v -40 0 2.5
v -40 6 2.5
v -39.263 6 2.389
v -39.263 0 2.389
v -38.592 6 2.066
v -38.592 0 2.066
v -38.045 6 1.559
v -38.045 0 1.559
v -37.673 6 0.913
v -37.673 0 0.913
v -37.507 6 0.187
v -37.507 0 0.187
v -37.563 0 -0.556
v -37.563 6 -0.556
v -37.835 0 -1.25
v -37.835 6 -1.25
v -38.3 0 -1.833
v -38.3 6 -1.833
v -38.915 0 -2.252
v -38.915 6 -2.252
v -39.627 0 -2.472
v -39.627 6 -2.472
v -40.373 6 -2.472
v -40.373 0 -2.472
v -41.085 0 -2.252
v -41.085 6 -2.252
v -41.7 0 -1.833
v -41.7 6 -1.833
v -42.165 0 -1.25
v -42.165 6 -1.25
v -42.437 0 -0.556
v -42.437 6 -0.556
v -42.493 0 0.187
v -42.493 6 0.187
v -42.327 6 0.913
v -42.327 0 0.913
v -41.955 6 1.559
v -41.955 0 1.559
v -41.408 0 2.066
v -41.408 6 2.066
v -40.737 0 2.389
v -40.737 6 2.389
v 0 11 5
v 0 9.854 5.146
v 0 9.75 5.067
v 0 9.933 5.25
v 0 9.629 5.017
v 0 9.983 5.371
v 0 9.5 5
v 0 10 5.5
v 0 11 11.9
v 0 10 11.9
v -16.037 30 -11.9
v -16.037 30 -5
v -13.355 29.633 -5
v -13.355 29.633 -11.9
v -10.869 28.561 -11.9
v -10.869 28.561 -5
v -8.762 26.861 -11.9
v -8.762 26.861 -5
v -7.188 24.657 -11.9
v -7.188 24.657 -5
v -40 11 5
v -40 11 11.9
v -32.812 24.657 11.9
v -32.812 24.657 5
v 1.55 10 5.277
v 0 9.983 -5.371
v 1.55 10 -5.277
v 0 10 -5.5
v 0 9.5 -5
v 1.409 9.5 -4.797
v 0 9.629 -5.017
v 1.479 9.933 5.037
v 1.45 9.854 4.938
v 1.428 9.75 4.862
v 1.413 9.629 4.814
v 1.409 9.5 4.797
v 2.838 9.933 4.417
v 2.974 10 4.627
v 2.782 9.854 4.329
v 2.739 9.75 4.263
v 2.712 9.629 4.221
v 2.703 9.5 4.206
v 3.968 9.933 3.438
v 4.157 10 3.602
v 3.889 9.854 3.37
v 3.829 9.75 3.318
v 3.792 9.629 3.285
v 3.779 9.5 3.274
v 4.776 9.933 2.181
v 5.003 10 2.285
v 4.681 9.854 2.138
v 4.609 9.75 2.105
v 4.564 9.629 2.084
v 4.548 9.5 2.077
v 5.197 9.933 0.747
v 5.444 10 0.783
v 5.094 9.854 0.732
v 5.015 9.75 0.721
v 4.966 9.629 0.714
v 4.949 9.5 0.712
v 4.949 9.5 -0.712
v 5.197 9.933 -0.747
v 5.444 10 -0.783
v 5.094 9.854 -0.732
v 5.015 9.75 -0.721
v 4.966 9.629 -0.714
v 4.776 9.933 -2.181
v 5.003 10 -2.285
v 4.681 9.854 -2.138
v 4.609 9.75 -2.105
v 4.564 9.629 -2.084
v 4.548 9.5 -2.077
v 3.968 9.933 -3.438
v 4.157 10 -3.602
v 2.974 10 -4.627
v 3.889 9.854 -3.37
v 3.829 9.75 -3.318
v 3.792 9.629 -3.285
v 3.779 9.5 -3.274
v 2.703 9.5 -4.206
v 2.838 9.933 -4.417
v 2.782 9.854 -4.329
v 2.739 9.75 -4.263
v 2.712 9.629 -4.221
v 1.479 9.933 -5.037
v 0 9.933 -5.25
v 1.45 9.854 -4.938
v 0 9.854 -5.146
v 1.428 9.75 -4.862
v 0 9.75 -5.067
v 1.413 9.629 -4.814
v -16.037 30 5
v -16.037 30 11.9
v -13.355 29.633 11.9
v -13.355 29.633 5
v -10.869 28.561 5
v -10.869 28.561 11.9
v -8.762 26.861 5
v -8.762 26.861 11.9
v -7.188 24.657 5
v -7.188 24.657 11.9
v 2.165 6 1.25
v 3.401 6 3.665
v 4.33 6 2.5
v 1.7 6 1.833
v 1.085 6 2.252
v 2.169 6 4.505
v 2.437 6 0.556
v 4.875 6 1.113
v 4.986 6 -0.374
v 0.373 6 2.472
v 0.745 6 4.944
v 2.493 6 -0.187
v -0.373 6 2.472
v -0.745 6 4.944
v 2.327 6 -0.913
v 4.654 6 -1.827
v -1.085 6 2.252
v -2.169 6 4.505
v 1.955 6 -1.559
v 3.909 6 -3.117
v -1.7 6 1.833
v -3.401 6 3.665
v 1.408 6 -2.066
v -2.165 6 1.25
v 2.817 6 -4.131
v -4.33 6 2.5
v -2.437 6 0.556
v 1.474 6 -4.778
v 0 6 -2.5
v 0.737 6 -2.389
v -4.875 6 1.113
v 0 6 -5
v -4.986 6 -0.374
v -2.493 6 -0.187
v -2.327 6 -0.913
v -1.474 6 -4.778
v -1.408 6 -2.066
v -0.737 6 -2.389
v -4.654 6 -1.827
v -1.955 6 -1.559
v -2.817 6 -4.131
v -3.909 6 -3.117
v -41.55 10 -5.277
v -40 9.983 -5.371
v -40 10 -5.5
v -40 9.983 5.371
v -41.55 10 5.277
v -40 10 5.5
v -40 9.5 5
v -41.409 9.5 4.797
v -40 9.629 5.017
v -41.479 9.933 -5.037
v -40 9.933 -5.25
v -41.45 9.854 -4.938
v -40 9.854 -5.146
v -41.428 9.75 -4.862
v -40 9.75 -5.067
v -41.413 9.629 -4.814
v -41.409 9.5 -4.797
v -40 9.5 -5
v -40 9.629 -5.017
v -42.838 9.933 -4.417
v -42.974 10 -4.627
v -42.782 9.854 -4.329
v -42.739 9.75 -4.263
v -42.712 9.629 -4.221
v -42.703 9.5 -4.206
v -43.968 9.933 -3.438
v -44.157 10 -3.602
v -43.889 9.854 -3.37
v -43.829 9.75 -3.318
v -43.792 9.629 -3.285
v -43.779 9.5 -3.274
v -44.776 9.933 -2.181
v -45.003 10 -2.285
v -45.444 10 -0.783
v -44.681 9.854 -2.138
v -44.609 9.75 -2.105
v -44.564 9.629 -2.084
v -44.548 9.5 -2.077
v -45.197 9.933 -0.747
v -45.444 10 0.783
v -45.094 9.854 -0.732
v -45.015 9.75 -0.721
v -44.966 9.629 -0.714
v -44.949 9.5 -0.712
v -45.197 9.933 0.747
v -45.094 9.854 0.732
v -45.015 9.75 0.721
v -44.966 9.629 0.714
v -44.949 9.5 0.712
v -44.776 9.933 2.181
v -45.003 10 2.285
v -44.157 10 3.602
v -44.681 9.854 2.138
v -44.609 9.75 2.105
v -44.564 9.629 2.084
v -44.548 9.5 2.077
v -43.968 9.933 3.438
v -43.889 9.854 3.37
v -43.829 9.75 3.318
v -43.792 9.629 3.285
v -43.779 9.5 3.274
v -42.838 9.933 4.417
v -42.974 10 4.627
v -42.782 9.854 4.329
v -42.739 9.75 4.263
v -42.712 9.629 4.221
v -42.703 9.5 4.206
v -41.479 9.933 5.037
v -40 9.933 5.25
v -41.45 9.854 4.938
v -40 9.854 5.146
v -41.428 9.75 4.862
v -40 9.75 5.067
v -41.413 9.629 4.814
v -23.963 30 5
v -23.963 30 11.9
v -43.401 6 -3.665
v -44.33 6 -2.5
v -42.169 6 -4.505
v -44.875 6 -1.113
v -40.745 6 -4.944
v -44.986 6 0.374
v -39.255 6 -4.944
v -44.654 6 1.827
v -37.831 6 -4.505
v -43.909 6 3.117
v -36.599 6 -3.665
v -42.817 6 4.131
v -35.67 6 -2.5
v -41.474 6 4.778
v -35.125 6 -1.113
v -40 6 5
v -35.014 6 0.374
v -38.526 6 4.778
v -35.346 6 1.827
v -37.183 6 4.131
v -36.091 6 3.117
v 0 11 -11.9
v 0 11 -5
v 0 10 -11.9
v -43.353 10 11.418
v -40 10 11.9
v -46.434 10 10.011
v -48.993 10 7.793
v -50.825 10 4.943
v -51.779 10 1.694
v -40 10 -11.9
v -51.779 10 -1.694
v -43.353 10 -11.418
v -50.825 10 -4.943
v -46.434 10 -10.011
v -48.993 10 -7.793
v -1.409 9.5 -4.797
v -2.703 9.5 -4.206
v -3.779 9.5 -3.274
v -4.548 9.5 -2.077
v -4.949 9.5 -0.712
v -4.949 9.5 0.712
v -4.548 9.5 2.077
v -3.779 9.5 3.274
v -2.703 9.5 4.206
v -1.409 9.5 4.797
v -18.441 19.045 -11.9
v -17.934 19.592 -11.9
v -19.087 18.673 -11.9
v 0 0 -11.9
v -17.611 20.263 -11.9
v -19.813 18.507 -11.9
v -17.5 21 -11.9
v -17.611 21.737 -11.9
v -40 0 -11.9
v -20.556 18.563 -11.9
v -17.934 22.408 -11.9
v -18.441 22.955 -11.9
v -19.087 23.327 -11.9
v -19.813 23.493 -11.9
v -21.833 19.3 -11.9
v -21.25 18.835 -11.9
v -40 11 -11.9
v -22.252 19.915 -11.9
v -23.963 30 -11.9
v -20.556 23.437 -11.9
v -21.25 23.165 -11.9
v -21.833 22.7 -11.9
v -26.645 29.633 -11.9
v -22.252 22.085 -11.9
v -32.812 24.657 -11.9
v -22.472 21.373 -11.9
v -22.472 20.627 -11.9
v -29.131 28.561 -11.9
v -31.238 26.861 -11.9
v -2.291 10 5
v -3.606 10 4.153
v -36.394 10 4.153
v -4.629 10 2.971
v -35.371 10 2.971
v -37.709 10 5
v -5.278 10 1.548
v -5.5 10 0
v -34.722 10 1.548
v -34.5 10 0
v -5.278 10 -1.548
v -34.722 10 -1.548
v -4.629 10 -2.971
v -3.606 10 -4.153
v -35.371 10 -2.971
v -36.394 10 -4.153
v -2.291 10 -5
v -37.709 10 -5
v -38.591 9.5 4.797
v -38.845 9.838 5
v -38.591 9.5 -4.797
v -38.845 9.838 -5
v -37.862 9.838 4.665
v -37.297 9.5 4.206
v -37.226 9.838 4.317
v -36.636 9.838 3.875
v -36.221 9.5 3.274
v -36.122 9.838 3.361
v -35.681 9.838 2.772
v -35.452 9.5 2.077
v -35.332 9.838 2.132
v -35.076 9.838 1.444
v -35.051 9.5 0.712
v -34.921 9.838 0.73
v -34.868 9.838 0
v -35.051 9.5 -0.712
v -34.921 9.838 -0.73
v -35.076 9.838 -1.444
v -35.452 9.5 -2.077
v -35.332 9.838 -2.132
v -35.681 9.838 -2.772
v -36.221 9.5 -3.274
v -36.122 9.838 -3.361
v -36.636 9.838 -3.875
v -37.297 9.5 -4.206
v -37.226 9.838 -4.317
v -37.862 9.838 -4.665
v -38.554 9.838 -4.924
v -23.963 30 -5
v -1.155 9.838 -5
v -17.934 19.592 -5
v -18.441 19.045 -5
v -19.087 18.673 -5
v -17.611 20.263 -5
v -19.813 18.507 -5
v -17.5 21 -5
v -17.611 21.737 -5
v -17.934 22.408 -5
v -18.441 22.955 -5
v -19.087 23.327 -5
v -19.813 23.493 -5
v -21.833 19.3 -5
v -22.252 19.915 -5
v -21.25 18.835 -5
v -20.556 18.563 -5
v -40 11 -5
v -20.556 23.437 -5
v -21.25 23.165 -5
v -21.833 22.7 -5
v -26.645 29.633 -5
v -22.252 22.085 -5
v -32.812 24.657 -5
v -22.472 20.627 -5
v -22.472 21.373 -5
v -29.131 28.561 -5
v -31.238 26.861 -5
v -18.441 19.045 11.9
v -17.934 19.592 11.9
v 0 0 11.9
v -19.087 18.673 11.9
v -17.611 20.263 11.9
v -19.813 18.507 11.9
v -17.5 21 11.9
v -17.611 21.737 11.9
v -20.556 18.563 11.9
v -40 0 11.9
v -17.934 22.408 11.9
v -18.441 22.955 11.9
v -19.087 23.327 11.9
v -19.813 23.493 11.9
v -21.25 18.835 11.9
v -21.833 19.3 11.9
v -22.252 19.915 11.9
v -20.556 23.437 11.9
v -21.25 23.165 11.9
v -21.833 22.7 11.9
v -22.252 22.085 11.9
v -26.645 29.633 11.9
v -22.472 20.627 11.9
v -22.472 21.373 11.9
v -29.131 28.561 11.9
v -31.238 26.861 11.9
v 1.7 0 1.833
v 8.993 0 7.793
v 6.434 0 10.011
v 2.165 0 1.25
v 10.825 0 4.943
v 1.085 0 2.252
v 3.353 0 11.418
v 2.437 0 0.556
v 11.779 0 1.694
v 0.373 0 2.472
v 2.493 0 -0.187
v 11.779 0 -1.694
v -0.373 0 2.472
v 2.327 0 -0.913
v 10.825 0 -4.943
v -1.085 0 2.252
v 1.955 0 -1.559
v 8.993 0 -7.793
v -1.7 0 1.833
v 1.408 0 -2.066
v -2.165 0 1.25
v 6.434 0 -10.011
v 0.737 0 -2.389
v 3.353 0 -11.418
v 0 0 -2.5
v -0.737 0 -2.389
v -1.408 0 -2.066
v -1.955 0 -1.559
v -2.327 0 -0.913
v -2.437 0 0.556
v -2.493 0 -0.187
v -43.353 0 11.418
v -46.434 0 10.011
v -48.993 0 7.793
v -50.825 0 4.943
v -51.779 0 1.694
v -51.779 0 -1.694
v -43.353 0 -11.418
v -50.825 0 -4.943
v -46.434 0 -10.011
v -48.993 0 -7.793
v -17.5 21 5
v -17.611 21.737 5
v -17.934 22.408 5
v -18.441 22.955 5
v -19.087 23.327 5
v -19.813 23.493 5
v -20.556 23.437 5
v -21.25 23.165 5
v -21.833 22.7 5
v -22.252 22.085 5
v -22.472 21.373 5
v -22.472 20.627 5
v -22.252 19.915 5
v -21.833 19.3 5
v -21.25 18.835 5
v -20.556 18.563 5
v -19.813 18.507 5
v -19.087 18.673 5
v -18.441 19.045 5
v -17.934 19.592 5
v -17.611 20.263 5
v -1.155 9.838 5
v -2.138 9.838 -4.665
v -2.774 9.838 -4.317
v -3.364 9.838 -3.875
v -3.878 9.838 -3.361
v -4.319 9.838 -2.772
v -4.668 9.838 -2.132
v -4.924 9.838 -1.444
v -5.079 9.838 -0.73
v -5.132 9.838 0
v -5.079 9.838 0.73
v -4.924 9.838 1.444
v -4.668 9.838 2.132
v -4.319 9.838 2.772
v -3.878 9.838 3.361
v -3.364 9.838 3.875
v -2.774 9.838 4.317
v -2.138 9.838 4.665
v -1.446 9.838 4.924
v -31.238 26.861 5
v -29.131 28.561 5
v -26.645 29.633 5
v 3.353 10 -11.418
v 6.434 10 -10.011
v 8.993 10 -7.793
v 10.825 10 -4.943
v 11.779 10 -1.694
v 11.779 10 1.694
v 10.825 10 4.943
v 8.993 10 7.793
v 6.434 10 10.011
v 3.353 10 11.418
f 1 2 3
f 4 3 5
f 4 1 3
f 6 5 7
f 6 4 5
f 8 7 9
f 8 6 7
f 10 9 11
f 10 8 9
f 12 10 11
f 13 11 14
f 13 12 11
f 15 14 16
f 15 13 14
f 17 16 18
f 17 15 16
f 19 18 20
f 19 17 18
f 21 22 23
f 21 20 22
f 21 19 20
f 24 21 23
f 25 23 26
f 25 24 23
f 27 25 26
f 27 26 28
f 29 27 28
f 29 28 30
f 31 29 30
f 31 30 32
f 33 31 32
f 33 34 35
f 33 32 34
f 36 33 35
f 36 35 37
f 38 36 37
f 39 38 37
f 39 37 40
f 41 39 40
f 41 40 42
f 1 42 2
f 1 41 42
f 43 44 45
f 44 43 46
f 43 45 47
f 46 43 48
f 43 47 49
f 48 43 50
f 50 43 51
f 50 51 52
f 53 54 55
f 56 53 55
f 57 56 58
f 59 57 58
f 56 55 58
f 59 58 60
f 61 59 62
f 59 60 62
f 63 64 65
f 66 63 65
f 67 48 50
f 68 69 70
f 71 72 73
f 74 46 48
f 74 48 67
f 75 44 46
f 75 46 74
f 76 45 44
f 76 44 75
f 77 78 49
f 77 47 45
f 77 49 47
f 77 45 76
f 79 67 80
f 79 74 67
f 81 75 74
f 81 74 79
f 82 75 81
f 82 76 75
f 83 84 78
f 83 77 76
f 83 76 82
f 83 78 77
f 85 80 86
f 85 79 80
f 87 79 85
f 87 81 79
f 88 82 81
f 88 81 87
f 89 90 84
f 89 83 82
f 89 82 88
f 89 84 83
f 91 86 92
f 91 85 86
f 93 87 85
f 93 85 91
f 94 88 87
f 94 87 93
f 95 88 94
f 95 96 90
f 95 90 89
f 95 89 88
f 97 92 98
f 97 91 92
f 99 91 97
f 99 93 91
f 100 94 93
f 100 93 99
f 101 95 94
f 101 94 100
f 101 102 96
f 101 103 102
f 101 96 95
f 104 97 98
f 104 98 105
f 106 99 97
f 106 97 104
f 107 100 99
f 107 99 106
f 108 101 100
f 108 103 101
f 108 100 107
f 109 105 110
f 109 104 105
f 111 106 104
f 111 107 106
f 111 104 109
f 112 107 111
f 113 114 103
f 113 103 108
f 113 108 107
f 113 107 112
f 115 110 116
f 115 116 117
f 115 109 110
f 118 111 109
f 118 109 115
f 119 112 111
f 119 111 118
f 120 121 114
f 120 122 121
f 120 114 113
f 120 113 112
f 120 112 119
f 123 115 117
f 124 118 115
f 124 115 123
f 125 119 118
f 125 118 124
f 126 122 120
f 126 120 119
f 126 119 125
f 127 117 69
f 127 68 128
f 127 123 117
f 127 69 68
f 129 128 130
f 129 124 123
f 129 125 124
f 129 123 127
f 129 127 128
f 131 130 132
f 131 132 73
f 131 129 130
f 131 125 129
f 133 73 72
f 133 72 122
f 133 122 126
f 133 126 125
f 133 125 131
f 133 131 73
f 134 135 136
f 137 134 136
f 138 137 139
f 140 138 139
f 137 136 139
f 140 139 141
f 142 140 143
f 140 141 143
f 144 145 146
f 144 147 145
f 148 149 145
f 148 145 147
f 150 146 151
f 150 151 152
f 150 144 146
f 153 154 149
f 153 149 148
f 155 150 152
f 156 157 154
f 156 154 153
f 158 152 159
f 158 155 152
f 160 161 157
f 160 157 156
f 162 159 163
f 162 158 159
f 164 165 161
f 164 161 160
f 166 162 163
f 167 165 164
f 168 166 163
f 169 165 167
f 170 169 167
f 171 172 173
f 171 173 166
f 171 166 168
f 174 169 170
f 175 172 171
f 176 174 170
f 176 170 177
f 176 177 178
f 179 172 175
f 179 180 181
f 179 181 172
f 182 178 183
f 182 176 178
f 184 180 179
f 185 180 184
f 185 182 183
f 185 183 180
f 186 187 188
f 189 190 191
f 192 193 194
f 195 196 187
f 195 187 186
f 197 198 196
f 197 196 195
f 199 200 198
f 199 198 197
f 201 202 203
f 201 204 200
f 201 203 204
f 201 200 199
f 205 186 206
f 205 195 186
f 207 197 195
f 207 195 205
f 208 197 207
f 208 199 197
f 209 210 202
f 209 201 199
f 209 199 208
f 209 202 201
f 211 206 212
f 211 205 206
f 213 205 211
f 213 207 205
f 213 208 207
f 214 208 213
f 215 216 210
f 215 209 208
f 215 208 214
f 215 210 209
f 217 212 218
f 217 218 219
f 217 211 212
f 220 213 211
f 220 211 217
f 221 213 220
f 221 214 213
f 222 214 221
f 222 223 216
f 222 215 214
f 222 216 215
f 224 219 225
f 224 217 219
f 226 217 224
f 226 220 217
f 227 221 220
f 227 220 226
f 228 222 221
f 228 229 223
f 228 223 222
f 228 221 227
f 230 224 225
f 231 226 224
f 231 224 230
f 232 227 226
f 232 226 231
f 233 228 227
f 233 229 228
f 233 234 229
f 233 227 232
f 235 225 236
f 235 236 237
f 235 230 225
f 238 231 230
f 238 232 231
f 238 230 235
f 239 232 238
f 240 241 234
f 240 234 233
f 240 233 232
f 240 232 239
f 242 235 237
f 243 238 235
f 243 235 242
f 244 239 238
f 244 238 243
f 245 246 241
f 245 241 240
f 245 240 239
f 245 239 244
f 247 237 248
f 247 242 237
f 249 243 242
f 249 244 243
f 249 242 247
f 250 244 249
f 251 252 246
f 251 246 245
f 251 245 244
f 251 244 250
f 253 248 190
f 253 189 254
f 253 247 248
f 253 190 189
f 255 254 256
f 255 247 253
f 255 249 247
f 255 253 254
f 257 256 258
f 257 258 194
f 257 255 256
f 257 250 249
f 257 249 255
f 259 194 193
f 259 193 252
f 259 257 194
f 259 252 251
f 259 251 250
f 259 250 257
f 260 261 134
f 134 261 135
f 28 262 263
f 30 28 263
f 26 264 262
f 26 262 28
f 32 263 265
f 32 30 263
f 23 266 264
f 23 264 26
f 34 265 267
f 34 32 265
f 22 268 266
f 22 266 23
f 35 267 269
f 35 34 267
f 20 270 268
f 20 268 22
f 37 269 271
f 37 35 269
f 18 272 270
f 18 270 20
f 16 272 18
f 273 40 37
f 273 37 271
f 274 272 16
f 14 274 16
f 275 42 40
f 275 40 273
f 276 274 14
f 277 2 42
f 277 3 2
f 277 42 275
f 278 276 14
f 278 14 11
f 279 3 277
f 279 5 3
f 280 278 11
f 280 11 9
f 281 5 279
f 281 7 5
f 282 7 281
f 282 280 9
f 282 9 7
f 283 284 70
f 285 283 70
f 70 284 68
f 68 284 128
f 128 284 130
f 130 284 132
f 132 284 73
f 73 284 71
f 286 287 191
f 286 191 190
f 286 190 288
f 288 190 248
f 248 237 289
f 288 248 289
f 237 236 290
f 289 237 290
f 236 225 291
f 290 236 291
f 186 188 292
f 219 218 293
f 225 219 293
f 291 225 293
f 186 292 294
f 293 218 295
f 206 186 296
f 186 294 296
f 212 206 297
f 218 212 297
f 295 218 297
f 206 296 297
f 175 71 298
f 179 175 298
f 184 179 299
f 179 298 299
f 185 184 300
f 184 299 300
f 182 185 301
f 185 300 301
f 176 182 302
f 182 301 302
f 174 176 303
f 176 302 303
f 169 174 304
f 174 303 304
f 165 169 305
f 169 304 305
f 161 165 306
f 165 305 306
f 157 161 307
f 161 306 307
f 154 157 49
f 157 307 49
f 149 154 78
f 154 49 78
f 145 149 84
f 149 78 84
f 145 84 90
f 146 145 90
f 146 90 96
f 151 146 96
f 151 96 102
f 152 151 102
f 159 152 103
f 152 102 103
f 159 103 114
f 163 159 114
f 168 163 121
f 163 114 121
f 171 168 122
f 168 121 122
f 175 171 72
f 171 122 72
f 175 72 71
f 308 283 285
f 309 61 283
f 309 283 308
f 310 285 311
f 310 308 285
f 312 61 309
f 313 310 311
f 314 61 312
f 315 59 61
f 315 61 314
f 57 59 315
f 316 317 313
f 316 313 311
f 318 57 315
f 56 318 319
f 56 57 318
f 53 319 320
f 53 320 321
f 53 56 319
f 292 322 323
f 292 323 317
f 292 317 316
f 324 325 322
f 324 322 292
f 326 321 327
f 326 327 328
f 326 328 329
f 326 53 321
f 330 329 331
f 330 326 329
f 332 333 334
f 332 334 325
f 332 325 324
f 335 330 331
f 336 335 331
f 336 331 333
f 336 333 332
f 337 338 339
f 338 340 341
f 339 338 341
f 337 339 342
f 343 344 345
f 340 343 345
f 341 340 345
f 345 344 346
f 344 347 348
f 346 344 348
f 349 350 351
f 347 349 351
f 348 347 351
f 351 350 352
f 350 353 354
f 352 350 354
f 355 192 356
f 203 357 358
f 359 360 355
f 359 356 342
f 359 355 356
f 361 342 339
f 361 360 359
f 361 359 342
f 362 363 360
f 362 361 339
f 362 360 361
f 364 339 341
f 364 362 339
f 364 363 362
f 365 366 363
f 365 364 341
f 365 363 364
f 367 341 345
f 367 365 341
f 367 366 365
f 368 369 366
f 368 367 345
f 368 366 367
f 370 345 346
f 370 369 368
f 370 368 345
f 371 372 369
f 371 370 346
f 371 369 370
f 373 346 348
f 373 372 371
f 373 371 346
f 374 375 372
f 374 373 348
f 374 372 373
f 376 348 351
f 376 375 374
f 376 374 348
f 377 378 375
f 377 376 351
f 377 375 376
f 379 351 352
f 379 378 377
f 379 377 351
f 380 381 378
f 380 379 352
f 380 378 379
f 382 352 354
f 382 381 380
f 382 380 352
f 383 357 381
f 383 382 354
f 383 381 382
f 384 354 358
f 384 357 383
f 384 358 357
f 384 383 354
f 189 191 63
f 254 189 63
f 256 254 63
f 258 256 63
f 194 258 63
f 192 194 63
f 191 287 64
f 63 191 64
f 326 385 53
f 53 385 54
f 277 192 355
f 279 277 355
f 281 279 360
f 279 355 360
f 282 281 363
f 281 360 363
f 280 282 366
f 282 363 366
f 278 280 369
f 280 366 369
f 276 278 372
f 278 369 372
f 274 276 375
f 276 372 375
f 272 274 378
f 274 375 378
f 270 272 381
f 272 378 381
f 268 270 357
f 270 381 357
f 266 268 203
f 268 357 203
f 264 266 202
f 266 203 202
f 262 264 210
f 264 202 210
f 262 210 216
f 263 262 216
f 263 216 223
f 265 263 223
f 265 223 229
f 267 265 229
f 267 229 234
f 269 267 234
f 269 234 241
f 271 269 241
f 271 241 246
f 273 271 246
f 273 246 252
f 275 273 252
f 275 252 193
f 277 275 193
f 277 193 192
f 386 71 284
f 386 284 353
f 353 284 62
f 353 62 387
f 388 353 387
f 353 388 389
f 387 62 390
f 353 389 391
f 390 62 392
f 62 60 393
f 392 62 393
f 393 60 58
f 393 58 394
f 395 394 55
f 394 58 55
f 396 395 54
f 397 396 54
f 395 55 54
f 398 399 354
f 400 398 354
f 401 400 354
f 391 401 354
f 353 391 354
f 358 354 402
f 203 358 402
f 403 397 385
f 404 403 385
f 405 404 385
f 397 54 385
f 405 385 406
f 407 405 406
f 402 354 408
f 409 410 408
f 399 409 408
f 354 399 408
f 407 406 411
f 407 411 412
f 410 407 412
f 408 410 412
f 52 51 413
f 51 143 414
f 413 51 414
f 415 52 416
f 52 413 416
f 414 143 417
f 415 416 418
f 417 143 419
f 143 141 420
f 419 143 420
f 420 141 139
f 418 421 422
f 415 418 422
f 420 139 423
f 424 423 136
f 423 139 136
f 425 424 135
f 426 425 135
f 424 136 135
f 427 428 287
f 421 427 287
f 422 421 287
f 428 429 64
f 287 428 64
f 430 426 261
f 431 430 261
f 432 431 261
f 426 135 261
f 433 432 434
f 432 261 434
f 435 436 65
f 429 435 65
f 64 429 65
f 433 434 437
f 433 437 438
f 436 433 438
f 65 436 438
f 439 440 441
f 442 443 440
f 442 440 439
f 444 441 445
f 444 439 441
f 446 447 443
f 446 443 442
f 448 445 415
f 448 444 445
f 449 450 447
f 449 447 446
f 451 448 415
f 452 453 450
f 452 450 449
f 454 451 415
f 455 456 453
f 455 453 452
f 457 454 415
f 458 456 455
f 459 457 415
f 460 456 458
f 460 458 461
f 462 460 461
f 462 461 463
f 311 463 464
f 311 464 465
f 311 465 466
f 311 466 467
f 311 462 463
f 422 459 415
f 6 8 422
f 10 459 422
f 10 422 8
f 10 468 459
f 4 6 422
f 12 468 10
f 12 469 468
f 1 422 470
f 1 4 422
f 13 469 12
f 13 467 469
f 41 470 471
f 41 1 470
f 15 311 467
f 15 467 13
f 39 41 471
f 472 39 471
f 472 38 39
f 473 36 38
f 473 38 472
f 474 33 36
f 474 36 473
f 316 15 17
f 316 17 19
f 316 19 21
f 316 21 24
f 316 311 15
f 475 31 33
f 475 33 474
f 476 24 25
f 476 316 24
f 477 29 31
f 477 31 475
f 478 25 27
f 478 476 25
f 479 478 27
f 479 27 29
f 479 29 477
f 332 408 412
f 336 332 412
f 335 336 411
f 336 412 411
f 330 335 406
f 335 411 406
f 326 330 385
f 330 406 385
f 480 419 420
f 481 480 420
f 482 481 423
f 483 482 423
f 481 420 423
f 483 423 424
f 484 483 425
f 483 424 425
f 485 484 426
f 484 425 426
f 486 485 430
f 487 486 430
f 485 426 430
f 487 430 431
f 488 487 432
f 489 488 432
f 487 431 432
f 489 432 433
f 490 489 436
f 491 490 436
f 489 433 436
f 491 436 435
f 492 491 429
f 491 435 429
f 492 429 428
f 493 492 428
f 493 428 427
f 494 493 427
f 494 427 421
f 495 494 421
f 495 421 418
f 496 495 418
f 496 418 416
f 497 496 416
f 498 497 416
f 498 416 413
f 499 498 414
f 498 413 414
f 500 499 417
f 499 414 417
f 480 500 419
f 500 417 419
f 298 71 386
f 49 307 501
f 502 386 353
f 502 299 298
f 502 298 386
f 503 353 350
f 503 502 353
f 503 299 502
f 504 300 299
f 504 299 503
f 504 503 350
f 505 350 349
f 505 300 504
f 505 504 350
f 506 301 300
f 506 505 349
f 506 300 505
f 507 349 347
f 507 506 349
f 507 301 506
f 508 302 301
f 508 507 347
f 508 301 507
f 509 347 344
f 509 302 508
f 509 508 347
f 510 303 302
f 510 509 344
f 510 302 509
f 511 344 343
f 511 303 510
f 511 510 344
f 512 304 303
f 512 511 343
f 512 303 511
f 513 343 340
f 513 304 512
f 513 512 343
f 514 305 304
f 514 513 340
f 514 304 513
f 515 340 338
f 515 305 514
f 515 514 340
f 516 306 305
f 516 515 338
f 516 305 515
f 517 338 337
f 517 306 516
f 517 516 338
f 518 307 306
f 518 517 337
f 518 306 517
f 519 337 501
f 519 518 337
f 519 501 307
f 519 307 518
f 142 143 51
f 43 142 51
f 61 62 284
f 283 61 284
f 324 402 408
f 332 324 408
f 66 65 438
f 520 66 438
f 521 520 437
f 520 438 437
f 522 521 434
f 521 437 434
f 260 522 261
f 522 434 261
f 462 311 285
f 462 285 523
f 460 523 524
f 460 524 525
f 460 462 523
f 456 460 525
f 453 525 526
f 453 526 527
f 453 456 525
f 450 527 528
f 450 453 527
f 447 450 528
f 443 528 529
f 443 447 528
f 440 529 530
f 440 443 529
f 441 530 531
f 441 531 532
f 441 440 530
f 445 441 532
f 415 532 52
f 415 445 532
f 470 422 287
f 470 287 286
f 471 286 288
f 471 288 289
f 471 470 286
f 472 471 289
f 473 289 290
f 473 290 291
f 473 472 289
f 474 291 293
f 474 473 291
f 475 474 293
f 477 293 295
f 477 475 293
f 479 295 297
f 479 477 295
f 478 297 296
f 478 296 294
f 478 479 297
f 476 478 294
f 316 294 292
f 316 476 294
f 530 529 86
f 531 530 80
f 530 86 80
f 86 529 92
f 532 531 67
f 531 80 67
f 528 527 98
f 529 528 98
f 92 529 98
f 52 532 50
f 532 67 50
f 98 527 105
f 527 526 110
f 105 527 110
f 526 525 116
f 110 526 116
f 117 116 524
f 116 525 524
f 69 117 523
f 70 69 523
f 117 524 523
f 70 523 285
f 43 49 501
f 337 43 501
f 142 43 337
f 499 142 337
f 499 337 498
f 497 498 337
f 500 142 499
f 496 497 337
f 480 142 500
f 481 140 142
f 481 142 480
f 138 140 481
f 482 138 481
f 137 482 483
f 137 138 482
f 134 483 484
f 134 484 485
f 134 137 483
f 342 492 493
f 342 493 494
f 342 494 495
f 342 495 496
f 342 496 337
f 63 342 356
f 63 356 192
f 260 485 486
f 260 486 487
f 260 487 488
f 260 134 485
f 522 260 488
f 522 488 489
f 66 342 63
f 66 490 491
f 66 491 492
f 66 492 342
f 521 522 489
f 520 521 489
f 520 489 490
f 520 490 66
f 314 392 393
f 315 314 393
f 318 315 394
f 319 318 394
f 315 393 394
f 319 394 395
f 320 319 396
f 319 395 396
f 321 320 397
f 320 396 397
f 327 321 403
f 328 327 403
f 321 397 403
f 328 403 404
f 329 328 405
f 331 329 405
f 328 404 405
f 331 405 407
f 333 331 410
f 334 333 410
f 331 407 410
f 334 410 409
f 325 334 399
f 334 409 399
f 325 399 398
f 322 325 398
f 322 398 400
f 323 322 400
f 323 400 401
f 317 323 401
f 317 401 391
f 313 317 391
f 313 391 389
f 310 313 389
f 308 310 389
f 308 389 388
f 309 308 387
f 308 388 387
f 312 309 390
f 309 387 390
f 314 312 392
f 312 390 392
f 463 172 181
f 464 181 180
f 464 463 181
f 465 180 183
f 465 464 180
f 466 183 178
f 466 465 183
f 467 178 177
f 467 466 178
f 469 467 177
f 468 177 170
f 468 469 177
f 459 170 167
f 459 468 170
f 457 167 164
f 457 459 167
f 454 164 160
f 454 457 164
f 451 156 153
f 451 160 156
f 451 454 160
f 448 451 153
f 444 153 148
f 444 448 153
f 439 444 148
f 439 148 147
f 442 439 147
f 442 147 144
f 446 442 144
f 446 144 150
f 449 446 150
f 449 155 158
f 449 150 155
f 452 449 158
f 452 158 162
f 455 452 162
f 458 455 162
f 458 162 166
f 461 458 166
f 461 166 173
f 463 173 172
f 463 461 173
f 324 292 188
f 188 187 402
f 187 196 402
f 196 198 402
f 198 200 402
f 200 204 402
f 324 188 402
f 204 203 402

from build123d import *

# Parameters (mm, degrees)
CROQUIS1_R              = 2.5
SALIENTE_EXTRUIR1_DEPTH = 10
CROQUIS3_R              = 2.5
SALIENTE_EXTRUIR2_DEPTH = 6.9
MATRIZL1_COUNT          = 2
MATRIZL1_PITCH          = 16.9
CROQUIS6_R              = 5
CORTAR_EXTRUIR1_DEPTH   = 4
REDONDEO3_R             = 0.5


with BuildPart() as part:
    # Croquis1 → Saliente-Extruir1 (new body)
    with BuildSketch(Plane(origin=(0, 0, 0), x_dir=(1, 0, 0), z_dir=(0, 1, 0))):
        with BuildLine():
            Line((0, -11.9), (-40, -11.9))
            ThreePointArc((-40, -11.9), (-51.9, 0), (-40, 11.9))
            Line((-40, 11.9), (0, 11.9))
            ThreePointArc((0, 11.9), (11.9, 0), (0, -11.9))
        make_face()
        with Locations(Location((-40, 0, 0), (0, 0, 270))):
            Circle(CROQUIS1_R, mode=Mode.SUBTRACT)
        with Locations(Location((0, 0, 0), (0, 0, 90))):
            Circle(CROQUIS1_R, mode=Mode.SUBTRACT)
    extrude(amount=SALIENTE_EXTRUIR1_DEPTH)

    # Croquis3 → Saliente-Extruir2 (add)
    with BuildSketch(Plane.XY.offset(11.9)):
        with BuildLine():
            Line((-40, 10), (-40, 11))
            Line((-40, 11), (-32.81186088, 24.657464328))
            ThreePointArc((-32.81186088, 24.657464328), (-29.131109594, 28.56080146), (-23.962678656, 30))
            Line((-23.962678656, 30), (-16.037321344, 30))
            ThreePointArc((-16.037321344, 30), (-10.868890406, 28.56080146), (-7.18813912, 24.657464328))
            Line((-7.18813912, 24.657464328), (0, 11))
            Line((0, 11), (0, 10))
            Line((0, 10), (0, 0))
            Line((0, 0), (-40, 0))
            Line((-40, 0), (-40, 10))
        make_face()
        with Locations((-20, 21)):
            Circle(CROQUIS3_R, mode=Mode.SUBTRACT)
    saliente_extruir2 = extrude(amount=-SALIENTE_EXTRUIR2_DEPTH)

    # MatrizL1: Saliente-Extruir2 ×2
    with Locations(*[(0, 0, -i * MATRIZL1_PITCH) for i in range(1, MATRIZL1_COUNT)]):
        add(saliente_extruir2)

    # Croquis6 → Cortar-Extruir1 (cut, symmetric)
    with BuildSketch(Plane(origin=(0, 10, 0), x_dir=(1, 0, 0), z_dir=(0, 1, 0))):
        with Locations(Location((-40, 0, 0), (0, 0, 270))):
            Circle(CROQUIS6_R)
        with Locations(Location((0, 0, 0), (0, 0, 90))):
            Circle(CROQUIS6_R)
    extrude(amount=CORTAR_EXTRUIR1_DEPTH, both=True, mode=Mode.SUBTRACT)

    # Redondeo3
    # the kernel refuses this fillet: 0.5 mm, written as the material it takes off along each edge
    with BuildSketch(Plane(origin=(-40, 10, 0), x_dir=(0, 0, -1), z_dir=(1, 0, 0))) as redondeo3_piece_1:
        with BuildLine():
            CenterArc((5 + REDONDEO3_R, -REDONDEO3_R), REDONDEO3_R, 90, 90)
            Line((5, -REDONDEO3_R), (5, 0))
            Line((5, 0), (5 + REDONDEO3_R, 0))
        make_face()
    revolve(axis=Axis((-40, 10, 0), (0, 1, 0)), revolution_arc=180, mode=Mode.SUBTRACT)
    with BuildSketch(Plane(origin=(-40, 10, 0), x_dir=(0, 0, 1), z_dir=(-1, 0, 0))) as redondeo3_piece_2_section:
        with BuildLine():
            CenterArc((5 + REDONDEO3_R, -REDONDEO3_R), REDONDEO3_R, 90, 90)
            Line((5 + REDONDEO3_R, 0), (5, 0))
            Line((5, 0), (5, -REDONDEO3_R))
        make_face()
    redondeo3_piece_2 = revolve(axis=Axis((-40, 10, 0), (0, 1, 0)), revolution_arc=180, mode=Mode.PRIVATE)
    redondeo3_piece_2 = split(redondeo3_piece_2, bisect_by=Plane(origin=(-34.859999019, 9.859999019, -5), z_dir=(0, 0, 1)), keep=Keep.TOP, mode=Mode.PRIVATE)
    redondeo3_piece_2 = split(redondeo3_piece_2, bisect_by=Plane(origin=(-34.859999019, 9.859999019, 5), z_dir=(0, 0, -1)), keep=Keep.TOP, mode=Mode.PRIVATE)
    add(redondeo3_piece_2, mode=Mode.SUBTRACT)
    with BuildSketch(Plane(origin=(0, 10, 0), x_dir=(0, 0, -1), z_dir=(1, 0, 0))) as redondeo3_piece_3_section:
        with BuildLine():
            CenterArc((5 + REDONDEO3_R, -REDONDEO3_R), REDONDEO3_R, 90, 90)
            Line((5, -REDONDEO3_R), (5, 0))
            Line((5, 0), (5 + REDONDEO3_R, 0))
        make_face()
    redondeo3_piece_3 = revolve(axis=Axis((0, 10, 0), (0, 1, 0)), revolution_arc=180, mode=Mode.PRIVATE)
    redondeo3_piece_3 = split(redondeo3_piece_3, bisect_by=Plane(origin=(-5.140000985, 9.859999015, -5), z_dir=(0, 0, 1)), keep=Keep.TOP, mode=Mode.PRIVATE)
    redondeo3_piece_3 = split(redondeo3_piece_3, bisect_by=Plane(origin=(-5.140000985, 9.859999015, 5), z_dir=(0, 0, -1)), keep=Keep.TOP, mode=Mode.PRIVATE)
    add(redondeo3_piece_3, mode=Mode.SUBTRACT)
    with BuildSketch(Plane(origin=(0, 10, 0), x_dir=(0, 0, 1), z_dir=(-1, 0, 0))) as redondeo3_piece_4:
        with BuildLine():
            CenterArc((5 + REDONDEO3_R, -REDONDEO3_R), REDONDEO3_R, 90, 90)
            Line((5, -REDONDEO3_R), (5, 0))
            Line((5, 0), (5 + REDONDEO3_R, 0))
        make_face()
    revolve(axis=Axis((0, 10, 0), (0, 1, 0)), revolution_arc=180, mode=Mode.SUBTRACT)


solid = part.part
